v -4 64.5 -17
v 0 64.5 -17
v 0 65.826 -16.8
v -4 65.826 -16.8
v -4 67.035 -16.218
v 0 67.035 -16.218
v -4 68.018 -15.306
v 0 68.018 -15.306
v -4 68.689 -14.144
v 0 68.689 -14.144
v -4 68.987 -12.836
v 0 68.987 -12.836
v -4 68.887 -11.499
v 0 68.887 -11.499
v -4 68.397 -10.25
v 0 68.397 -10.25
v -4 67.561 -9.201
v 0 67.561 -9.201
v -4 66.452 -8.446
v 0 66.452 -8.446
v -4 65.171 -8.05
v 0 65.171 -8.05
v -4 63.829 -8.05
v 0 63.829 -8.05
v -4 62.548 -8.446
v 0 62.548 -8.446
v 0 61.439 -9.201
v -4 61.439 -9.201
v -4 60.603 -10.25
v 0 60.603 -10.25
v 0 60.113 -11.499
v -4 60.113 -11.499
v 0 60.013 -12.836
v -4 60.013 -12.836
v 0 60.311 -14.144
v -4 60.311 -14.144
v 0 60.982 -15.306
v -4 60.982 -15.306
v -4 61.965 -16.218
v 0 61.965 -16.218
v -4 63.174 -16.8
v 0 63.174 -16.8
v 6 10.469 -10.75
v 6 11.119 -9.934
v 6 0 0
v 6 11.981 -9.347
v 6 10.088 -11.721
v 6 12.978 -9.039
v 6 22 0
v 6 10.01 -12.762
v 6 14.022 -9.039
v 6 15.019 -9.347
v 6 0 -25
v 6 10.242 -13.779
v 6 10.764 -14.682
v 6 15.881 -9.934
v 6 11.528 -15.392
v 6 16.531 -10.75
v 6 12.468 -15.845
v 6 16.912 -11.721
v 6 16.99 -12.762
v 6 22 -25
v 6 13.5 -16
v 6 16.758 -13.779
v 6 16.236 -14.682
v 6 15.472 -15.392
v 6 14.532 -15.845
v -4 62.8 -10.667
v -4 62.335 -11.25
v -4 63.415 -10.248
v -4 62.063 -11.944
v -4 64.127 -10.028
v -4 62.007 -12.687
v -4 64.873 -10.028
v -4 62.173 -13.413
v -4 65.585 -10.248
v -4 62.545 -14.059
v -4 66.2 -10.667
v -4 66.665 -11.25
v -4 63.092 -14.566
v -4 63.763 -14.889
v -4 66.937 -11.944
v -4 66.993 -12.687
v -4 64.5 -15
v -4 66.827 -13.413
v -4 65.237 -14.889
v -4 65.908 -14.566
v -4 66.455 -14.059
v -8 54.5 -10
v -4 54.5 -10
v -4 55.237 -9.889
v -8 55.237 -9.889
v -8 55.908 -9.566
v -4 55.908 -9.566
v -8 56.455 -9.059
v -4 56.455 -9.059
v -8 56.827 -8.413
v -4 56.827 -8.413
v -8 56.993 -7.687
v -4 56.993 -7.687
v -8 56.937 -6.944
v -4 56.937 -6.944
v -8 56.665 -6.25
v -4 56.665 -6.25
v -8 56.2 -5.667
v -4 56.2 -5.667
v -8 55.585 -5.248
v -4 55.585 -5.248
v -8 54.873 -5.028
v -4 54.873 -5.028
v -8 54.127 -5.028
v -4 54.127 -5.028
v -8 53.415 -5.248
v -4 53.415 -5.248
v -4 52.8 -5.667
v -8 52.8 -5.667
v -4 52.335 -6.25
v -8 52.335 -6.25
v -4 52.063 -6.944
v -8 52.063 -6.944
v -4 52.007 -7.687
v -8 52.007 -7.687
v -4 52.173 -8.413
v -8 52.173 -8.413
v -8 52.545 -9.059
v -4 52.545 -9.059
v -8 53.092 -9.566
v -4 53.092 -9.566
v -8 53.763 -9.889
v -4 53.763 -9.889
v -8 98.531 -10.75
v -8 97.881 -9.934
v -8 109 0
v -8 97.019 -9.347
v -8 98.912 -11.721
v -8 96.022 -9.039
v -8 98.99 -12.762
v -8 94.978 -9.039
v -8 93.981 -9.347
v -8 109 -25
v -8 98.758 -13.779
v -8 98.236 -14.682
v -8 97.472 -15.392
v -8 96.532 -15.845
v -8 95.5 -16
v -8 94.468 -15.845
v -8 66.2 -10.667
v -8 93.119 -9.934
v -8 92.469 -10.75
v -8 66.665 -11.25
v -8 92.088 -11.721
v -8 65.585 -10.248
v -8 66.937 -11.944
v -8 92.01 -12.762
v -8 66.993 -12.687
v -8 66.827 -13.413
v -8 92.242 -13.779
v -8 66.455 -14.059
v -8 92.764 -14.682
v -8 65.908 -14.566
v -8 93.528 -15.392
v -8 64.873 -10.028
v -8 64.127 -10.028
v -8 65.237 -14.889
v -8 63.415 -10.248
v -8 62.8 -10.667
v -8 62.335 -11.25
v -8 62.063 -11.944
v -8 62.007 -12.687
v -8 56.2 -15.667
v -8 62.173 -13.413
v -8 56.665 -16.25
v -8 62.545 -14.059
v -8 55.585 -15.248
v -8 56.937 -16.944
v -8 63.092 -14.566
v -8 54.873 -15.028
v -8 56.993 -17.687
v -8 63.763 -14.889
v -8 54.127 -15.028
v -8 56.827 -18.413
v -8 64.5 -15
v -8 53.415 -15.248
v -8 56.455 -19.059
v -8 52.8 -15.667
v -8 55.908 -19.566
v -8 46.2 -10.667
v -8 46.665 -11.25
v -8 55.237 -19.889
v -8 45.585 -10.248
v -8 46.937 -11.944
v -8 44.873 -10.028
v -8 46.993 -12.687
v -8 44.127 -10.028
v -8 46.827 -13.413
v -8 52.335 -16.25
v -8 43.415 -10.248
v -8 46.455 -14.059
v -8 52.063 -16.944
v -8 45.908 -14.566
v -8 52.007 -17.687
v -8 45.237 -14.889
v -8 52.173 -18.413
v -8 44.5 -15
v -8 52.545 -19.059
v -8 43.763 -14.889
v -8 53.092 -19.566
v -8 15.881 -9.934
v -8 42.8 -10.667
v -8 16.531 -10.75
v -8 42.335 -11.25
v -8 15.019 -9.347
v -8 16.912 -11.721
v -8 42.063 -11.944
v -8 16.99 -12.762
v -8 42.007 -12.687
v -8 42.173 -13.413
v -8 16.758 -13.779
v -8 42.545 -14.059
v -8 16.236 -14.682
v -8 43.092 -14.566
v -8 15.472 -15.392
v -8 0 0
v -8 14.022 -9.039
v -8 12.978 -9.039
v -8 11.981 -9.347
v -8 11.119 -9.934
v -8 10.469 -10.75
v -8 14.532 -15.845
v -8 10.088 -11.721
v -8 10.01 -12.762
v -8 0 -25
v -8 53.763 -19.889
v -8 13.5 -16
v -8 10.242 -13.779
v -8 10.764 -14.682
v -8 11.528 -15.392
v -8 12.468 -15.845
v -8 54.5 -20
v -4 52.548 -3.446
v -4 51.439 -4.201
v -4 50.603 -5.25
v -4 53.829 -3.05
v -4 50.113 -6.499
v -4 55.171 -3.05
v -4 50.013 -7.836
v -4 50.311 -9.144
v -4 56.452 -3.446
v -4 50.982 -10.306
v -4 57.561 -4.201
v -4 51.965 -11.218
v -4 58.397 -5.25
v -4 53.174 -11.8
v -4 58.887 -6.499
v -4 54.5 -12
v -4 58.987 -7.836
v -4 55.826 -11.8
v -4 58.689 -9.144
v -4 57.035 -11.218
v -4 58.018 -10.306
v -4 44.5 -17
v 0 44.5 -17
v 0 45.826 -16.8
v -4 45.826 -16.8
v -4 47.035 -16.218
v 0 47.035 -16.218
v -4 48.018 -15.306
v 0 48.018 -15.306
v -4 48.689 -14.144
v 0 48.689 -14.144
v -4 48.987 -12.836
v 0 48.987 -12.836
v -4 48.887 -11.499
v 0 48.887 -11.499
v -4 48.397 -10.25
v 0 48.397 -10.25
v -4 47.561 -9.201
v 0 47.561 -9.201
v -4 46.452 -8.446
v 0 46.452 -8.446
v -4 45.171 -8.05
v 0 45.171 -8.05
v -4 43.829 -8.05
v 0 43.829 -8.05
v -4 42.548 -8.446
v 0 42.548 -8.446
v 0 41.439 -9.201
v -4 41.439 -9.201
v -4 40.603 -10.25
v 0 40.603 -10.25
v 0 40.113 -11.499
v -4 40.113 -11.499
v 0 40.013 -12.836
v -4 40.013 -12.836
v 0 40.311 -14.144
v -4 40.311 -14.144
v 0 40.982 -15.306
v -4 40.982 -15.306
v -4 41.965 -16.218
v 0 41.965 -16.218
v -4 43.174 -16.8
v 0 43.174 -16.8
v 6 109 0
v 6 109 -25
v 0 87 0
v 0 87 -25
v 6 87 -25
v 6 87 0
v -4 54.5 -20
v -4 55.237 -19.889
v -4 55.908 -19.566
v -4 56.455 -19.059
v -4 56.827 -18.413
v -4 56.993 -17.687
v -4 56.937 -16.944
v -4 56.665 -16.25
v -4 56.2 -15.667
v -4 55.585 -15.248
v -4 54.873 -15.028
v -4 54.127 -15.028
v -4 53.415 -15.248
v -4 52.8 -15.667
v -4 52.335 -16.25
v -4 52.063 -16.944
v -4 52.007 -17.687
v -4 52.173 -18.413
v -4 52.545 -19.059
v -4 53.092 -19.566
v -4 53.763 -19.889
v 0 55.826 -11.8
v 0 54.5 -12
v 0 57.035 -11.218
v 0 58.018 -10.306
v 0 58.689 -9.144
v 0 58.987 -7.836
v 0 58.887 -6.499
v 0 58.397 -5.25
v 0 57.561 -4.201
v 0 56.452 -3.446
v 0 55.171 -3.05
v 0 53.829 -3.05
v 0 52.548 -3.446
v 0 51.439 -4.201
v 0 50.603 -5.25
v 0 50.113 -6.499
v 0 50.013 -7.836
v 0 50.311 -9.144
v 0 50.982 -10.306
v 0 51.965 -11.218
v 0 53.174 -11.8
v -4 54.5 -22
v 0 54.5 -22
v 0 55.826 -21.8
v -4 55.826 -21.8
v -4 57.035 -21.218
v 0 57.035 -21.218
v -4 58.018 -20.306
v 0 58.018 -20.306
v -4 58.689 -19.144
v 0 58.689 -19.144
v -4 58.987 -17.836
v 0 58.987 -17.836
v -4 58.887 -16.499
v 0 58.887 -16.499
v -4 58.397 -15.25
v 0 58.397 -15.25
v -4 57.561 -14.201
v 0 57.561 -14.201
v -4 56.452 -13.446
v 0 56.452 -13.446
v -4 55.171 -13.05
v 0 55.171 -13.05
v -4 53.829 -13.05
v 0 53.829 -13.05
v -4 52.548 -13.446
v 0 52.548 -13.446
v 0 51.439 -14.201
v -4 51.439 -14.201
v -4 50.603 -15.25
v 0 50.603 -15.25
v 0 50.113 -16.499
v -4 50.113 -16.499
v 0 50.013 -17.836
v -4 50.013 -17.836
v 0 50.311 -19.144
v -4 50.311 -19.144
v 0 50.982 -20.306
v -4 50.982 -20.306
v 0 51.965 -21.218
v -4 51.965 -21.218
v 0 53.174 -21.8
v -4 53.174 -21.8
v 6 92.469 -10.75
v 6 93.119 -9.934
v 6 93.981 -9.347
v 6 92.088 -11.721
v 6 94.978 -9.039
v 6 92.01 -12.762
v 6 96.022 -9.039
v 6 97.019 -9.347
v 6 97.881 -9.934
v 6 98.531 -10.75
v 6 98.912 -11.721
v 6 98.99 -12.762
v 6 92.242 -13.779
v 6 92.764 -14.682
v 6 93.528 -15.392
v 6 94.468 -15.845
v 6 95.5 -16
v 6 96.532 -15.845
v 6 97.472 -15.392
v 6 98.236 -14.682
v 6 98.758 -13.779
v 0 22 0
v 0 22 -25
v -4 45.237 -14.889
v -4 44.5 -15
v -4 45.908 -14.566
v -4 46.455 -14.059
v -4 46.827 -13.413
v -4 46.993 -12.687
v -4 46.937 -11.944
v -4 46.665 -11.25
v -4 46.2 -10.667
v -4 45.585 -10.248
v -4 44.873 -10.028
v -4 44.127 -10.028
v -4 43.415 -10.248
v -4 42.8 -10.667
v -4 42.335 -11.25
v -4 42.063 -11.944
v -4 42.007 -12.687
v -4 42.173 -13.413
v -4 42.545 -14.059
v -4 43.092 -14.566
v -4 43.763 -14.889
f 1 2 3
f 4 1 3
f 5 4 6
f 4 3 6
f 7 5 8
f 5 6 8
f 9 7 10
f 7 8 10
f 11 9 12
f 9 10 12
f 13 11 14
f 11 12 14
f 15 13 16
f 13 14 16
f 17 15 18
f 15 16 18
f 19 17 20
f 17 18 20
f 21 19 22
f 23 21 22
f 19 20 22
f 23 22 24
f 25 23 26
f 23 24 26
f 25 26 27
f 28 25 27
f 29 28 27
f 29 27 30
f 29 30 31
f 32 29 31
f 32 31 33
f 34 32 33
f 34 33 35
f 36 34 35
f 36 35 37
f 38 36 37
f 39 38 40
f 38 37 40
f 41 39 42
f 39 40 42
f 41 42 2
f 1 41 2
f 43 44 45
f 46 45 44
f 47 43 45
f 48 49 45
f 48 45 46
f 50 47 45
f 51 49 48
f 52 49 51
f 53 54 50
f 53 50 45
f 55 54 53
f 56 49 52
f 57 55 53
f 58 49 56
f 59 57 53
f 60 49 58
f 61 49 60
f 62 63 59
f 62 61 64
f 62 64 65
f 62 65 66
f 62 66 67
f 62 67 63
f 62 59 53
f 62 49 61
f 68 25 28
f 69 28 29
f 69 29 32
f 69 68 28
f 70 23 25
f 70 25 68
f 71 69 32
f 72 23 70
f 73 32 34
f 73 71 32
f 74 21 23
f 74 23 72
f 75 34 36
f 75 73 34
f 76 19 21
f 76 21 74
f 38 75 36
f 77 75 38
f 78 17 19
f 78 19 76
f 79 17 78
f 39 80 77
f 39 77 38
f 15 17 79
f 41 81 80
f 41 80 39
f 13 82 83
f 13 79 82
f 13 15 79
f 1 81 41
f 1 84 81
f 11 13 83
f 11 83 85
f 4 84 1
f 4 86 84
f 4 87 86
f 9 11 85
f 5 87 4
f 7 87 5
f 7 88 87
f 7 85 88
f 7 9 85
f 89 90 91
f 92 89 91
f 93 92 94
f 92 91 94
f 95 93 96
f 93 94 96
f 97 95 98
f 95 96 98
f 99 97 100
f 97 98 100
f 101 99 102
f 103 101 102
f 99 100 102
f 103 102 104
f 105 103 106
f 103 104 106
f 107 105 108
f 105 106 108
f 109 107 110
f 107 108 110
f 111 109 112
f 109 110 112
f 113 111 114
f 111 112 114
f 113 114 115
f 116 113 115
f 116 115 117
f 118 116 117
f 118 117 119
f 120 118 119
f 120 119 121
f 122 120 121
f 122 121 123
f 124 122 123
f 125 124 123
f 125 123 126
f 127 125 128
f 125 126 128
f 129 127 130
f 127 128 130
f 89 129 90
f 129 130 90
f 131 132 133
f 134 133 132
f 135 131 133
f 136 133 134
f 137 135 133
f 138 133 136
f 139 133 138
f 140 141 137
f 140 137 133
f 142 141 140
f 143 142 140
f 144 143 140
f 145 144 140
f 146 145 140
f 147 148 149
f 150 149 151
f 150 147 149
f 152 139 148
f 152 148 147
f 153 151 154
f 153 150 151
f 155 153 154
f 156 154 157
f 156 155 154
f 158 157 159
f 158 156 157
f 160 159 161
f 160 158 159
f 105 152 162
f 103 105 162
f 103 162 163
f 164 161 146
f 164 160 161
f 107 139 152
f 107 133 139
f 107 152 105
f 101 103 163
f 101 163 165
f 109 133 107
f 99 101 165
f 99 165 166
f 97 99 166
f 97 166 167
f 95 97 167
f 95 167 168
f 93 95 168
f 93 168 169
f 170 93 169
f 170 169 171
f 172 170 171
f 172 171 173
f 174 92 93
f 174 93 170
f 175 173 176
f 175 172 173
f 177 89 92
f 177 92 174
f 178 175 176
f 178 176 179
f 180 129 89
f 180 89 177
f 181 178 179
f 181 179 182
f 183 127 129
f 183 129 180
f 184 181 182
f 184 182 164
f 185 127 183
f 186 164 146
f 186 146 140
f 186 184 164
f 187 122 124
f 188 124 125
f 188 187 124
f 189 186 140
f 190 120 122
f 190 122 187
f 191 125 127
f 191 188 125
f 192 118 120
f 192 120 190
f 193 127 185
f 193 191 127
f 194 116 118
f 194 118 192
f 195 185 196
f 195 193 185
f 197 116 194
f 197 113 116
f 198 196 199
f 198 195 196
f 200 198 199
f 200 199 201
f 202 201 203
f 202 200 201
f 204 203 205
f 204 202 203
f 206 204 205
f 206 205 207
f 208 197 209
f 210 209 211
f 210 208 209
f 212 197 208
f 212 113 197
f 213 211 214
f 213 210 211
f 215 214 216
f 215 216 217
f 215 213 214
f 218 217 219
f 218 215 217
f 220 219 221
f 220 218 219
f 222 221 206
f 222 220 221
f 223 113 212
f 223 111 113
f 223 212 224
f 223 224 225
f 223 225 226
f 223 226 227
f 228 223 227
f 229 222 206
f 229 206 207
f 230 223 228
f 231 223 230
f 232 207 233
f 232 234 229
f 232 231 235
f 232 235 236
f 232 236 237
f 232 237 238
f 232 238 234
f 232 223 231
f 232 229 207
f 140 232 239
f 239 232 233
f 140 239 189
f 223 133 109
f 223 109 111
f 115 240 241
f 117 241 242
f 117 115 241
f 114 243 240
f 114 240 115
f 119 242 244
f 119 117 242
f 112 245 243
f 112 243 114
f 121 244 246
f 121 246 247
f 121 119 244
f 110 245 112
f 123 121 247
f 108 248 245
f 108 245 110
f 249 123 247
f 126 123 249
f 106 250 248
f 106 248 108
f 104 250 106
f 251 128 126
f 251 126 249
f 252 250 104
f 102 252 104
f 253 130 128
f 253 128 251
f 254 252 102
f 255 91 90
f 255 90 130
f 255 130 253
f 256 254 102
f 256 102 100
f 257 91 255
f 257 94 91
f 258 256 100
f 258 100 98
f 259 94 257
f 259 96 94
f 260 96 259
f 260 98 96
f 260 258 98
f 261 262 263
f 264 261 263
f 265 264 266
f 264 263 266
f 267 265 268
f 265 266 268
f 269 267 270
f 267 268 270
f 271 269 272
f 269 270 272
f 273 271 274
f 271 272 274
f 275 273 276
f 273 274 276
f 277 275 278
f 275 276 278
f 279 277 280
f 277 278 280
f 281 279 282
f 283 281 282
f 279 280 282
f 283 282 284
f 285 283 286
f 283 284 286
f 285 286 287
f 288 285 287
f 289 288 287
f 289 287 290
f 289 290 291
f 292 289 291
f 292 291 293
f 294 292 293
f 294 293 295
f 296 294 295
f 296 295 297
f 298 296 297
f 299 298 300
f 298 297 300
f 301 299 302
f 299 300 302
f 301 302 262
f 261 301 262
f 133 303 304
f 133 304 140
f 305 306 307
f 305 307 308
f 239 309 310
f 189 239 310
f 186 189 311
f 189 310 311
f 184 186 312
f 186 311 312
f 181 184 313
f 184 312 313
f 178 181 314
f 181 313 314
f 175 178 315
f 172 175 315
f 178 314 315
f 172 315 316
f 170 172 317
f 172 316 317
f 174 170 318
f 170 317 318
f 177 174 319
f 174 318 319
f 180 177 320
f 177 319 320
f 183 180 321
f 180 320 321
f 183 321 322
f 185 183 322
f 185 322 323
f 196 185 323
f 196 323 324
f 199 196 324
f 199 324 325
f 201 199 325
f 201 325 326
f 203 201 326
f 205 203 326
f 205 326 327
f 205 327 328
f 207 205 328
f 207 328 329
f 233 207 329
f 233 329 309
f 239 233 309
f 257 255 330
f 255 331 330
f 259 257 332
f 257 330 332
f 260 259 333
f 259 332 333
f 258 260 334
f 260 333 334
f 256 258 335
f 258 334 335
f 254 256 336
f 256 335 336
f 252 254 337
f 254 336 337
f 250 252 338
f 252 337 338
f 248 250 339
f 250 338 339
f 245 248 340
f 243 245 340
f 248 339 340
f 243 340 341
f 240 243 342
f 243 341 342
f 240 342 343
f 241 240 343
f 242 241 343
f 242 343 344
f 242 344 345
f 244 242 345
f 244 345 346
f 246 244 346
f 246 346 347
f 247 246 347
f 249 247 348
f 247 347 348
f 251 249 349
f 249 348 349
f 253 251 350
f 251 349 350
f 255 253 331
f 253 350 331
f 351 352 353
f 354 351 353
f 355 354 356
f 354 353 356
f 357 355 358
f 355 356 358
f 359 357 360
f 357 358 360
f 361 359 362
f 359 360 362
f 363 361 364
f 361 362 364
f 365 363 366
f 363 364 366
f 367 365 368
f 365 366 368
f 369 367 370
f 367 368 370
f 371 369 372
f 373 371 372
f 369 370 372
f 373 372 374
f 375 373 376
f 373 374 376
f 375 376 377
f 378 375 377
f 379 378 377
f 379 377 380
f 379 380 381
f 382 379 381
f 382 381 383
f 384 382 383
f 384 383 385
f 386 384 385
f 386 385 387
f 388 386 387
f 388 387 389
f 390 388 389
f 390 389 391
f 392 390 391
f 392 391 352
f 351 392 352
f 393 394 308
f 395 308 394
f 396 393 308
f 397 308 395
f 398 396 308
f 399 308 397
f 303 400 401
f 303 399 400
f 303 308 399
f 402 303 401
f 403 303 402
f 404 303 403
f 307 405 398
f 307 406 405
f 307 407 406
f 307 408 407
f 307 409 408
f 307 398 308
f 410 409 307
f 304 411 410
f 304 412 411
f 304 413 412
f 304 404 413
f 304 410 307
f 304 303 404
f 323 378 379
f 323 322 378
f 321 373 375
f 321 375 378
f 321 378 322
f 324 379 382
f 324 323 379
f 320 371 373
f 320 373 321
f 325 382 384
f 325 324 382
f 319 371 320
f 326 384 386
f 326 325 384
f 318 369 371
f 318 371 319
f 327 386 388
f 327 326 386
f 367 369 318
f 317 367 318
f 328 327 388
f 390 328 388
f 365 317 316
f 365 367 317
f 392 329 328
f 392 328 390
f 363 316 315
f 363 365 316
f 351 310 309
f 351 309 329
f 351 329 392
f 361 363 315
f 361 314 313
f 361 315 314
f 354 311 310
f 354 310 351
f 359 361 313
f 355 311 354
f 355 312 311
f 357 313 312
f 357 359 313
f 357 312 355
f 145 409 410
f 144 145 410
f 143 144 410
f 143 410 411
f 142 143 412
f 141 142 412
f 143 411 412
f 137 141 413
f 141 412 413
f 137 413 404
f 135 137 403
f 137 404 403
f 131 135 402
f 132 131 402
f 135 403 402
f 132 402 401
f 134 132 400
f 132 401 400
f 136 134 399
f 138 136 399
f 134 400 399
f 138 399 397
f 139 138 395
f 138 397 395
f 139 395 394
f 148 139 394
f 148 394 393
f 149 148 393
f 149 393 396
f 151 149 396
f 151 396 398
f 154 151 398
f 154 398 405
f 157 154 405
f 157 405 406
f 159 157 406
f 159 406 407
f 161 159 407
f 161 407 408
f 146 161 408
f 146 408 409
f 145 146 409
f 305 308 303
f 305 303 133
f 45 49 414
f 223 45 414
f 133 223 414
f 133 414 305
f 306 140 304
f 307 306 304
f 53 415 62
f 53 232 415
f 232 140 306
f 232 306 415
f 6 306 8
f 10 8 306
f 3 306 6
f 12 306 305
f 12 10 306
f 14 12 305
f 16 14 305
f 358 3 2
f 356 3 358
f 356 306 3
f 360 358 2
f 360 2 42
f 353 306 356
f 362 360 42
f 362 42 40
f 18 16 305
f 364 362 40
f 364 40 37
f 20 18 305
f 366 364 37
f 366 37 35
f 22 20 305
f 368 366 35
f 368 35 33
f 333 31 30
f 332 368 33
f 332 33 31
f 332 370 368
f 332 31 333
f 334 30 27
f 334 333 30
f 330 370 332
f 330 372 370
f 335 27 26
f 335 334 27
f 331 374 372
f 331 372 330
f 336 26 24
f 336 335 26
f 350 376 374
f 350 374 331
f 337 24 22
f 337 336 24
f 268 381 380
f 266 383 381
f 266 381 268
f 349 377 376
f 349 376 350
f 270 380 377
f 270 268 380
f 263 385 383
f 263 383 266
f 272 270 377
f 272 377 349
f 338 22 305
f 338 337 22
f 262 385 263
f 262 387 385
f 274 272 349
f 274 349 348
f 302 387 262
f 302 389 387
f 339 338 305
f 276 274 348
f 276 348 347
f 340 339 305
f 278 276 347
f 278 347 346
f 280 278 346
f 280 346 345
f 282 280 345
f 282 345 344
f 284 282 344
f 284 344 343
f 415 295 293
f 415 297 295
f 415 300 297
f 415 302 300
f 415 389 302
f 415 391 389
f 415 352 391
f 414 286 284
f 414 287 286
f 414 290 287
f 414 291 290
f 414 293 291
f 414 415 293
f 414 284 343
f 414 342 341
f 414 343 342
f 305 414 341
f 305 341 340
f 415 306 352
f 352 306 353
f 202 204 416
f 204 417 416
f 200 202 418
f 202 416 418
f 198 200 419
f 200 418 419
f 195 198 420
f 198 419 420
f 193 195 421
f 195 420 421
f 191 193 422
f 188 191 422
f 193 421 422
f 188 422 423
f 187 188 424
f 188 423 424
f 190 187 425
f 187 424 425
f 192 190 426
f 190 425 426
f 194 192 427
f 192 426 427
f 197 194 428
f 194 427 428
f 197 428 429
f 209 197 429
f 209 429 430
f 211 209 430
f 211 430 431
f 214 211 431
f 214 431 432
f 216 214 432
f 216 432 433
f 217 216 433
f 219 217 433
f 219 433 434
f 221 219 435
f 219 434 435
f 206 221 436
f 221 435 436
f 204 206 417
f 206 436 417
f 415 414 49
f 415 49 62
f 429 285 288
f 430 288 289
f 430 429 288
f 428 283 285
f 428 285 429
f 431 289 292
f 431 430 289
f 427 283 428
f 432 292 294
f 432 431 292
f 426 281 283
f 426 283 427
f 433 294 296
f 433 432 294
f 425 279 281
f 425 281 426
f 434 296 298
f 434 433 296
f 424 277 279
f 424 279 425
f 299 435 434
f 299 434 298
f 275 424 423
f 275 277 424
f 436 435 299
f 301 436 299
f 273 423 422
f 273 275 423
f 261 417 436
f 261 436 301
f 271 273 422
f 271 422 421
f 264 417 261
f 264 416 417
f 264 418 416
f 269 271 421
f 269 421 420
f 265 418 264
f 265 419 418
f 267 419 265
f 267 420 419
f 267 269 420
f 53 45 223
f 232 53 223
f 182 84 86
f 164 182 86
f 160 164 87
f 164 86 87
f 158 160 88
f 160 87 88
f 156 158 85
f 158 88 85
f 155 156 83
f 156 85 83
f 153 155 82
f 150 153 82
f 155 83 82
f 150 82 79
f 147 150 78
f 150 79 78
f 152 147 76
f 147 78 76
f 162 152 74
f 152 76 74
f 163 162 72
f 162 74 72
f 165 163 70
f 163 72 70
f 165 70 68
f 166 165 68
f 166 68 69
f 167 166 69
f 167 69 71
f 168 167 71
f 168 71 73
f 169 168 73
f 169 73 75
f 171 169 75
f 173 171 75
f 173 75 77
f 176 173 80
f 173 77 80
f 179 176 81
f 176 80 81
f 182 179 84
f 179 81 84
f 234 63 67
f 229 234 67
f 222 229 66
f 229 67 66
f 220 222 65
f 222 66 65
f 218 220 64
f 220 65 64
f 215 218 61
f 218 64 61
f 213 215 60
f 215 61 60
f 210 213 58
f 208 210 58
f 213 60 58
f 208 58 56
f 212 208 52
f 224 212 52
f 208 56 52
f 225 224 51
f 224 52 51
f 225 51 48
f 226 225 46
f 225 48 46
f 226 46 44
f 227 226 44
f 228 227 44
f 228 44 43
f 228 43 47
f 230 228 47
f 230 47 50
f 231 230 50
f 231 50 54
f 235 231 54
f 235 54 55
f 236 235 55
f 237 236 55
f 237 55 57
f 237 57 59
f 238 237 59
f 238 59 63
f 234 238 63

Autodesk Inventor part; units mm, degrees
ref_plane "YZ Plane" through (0, 0, 0) normal (1, 0, 0) x (0, 1, 0)
ref_plane "XZ Plane" through (0, 0, 0) normal (0, 1, 0) x (-1, 0, 0)
ref_plane "XY Plane" through (0, 0, 0) normal (0, 0, 1) x (1, 0, 0)
sketch "Sketch1" plane through (0, 0, 0) normal (0, 1, 0) x (-1, 0, 0)
  line L0 (0, 0) -> (8, 0)
  line L1 (8, 0) -> (8, -25)
  line L2 (8, -25) -> (0, -25)
  line L3 (0, -25) -> (0, 0)
  dimension "d0" = 8
  dimension "d1" = 25
extrude "Extrusion1" add sketch "Sketch1" along normal blind 109
sketch "Sketch2" plane through (0, 0, 0) normal (1, 0, 0) x (0, 0, -1)
  line L0 (0, 109) -> (25, 109) projected
  line L1 (0, 109) -> (25, 109)
  line L2 (25, 109) -> (25, 87)
  line L3 (25, 87) -> (0, 87)
  line L4 (0, 87) -> (0, 109)
  line L5 (25, 0) -> (25, 109) projected
  line L6 (25, 0) -> (0, 0)
  line L7 (0, 0) -> (0, 22)
  line L8 (0, 22) -> (25, 22)
  line L9 (25, 22) -> (25, 0)
  dimension "d4" = 25
  dimension "d5" = 22
  dimension "d6" = 25
  dimension "d7" = 22
extrude "Extrusion2" add sketch "Sketch2" along normal blind 6
sketch "Sketch3" plane through (6, 0, 0) normal (1, 0, 0) x (0, 0, -1)
  line L0 (0, 0) -> (25, 0) projected
  line L1 (0, 0) -> (12.5, 0)
  line L2 (12.5, 0) -> (12.5, 13.5)
  circle A0 centre (12.5, 13.5) radius 3.5
  circle A1 centre (12.5, 95.5) radius 3.5
  line L3 (25, 109) -> (0, 109) projected
  line L4 (0, 109) -> (0, 87) projected
  dimension "d10" = 13.5
  dimension "d11" = 7
  dimension "d12" = 7
  dimension "d13" = 13.5
  dimension "d14" = 12.5
sketch "Sketch4" plane through (0, 22, -25) normal (1, 0, 0) x (0, 0, -1)
  circle A0 centre (-17.5, 32.5) radius 2.5
  line L0 (-25, -22) -> (0, -22) projected
  line L1 (-25, 0) -> (-25, 65) projected
  circle A1 centre (-7.5, 32.5) radius 2.5
  line L2 (0, 0) -> (0, 65) projected
  circle A2 centre (-12.5, 22.5) radius 2.5
  circle A3 centre (-12.5, 42.5) radius 2.5
  dimension "d15" = 5
  dimension "d16" = 54.5
  dimension "d17" = 7.5
  dimension "d18" = 5
  dimension "d19" = 7.5
  dimension "d20" = 54.5
  dimension "d21" = 5
  dimension "d22" = 5
  dimension "d23" = 10
  dimension "d24" = 5
  dimension "d25" = 10
  dimension "d26" = 5
extrude "Extrusion3" cut sketch "Sketch3" against normal up to next
extrude "Extrusion4" cut sketch "Sketch4" against normal up to next
sketch "Sketch5" plane through (0, 22, -25) normal (1, 0, 0) x (0, 0, -1)
  circle A0 centre (-12.5, 42.5) radius 2.5 projected
  circle A1 centre (-12.5, 42.5) radius 4.5
  circle A2 centre (-17.5, 32.5) radius 2.5 projected
  circle A3 centre (-17.5, 32.5) radius 4.5
  circle A4 centre (-7.5, 32.5) radius 2.5 projected
  circle A5 centre (-7.5, 32.5) radius 4.5
  circle A6 centre (-12.5, 22.5) radius 2.5 projected
  circle A7 centre (-12.5, 22.5) radius 4.5
  point P0 (-25, -22)
  dimension "d31" = 9
  dimension "d32" = 9
  dimension "d33" = 9
  dimension "d34" = 9
extrude "Extrusion5" cut sketch "Sketch5" against normal blind 4
properties part number "Back_Bracket" material "ABS Plastic"
